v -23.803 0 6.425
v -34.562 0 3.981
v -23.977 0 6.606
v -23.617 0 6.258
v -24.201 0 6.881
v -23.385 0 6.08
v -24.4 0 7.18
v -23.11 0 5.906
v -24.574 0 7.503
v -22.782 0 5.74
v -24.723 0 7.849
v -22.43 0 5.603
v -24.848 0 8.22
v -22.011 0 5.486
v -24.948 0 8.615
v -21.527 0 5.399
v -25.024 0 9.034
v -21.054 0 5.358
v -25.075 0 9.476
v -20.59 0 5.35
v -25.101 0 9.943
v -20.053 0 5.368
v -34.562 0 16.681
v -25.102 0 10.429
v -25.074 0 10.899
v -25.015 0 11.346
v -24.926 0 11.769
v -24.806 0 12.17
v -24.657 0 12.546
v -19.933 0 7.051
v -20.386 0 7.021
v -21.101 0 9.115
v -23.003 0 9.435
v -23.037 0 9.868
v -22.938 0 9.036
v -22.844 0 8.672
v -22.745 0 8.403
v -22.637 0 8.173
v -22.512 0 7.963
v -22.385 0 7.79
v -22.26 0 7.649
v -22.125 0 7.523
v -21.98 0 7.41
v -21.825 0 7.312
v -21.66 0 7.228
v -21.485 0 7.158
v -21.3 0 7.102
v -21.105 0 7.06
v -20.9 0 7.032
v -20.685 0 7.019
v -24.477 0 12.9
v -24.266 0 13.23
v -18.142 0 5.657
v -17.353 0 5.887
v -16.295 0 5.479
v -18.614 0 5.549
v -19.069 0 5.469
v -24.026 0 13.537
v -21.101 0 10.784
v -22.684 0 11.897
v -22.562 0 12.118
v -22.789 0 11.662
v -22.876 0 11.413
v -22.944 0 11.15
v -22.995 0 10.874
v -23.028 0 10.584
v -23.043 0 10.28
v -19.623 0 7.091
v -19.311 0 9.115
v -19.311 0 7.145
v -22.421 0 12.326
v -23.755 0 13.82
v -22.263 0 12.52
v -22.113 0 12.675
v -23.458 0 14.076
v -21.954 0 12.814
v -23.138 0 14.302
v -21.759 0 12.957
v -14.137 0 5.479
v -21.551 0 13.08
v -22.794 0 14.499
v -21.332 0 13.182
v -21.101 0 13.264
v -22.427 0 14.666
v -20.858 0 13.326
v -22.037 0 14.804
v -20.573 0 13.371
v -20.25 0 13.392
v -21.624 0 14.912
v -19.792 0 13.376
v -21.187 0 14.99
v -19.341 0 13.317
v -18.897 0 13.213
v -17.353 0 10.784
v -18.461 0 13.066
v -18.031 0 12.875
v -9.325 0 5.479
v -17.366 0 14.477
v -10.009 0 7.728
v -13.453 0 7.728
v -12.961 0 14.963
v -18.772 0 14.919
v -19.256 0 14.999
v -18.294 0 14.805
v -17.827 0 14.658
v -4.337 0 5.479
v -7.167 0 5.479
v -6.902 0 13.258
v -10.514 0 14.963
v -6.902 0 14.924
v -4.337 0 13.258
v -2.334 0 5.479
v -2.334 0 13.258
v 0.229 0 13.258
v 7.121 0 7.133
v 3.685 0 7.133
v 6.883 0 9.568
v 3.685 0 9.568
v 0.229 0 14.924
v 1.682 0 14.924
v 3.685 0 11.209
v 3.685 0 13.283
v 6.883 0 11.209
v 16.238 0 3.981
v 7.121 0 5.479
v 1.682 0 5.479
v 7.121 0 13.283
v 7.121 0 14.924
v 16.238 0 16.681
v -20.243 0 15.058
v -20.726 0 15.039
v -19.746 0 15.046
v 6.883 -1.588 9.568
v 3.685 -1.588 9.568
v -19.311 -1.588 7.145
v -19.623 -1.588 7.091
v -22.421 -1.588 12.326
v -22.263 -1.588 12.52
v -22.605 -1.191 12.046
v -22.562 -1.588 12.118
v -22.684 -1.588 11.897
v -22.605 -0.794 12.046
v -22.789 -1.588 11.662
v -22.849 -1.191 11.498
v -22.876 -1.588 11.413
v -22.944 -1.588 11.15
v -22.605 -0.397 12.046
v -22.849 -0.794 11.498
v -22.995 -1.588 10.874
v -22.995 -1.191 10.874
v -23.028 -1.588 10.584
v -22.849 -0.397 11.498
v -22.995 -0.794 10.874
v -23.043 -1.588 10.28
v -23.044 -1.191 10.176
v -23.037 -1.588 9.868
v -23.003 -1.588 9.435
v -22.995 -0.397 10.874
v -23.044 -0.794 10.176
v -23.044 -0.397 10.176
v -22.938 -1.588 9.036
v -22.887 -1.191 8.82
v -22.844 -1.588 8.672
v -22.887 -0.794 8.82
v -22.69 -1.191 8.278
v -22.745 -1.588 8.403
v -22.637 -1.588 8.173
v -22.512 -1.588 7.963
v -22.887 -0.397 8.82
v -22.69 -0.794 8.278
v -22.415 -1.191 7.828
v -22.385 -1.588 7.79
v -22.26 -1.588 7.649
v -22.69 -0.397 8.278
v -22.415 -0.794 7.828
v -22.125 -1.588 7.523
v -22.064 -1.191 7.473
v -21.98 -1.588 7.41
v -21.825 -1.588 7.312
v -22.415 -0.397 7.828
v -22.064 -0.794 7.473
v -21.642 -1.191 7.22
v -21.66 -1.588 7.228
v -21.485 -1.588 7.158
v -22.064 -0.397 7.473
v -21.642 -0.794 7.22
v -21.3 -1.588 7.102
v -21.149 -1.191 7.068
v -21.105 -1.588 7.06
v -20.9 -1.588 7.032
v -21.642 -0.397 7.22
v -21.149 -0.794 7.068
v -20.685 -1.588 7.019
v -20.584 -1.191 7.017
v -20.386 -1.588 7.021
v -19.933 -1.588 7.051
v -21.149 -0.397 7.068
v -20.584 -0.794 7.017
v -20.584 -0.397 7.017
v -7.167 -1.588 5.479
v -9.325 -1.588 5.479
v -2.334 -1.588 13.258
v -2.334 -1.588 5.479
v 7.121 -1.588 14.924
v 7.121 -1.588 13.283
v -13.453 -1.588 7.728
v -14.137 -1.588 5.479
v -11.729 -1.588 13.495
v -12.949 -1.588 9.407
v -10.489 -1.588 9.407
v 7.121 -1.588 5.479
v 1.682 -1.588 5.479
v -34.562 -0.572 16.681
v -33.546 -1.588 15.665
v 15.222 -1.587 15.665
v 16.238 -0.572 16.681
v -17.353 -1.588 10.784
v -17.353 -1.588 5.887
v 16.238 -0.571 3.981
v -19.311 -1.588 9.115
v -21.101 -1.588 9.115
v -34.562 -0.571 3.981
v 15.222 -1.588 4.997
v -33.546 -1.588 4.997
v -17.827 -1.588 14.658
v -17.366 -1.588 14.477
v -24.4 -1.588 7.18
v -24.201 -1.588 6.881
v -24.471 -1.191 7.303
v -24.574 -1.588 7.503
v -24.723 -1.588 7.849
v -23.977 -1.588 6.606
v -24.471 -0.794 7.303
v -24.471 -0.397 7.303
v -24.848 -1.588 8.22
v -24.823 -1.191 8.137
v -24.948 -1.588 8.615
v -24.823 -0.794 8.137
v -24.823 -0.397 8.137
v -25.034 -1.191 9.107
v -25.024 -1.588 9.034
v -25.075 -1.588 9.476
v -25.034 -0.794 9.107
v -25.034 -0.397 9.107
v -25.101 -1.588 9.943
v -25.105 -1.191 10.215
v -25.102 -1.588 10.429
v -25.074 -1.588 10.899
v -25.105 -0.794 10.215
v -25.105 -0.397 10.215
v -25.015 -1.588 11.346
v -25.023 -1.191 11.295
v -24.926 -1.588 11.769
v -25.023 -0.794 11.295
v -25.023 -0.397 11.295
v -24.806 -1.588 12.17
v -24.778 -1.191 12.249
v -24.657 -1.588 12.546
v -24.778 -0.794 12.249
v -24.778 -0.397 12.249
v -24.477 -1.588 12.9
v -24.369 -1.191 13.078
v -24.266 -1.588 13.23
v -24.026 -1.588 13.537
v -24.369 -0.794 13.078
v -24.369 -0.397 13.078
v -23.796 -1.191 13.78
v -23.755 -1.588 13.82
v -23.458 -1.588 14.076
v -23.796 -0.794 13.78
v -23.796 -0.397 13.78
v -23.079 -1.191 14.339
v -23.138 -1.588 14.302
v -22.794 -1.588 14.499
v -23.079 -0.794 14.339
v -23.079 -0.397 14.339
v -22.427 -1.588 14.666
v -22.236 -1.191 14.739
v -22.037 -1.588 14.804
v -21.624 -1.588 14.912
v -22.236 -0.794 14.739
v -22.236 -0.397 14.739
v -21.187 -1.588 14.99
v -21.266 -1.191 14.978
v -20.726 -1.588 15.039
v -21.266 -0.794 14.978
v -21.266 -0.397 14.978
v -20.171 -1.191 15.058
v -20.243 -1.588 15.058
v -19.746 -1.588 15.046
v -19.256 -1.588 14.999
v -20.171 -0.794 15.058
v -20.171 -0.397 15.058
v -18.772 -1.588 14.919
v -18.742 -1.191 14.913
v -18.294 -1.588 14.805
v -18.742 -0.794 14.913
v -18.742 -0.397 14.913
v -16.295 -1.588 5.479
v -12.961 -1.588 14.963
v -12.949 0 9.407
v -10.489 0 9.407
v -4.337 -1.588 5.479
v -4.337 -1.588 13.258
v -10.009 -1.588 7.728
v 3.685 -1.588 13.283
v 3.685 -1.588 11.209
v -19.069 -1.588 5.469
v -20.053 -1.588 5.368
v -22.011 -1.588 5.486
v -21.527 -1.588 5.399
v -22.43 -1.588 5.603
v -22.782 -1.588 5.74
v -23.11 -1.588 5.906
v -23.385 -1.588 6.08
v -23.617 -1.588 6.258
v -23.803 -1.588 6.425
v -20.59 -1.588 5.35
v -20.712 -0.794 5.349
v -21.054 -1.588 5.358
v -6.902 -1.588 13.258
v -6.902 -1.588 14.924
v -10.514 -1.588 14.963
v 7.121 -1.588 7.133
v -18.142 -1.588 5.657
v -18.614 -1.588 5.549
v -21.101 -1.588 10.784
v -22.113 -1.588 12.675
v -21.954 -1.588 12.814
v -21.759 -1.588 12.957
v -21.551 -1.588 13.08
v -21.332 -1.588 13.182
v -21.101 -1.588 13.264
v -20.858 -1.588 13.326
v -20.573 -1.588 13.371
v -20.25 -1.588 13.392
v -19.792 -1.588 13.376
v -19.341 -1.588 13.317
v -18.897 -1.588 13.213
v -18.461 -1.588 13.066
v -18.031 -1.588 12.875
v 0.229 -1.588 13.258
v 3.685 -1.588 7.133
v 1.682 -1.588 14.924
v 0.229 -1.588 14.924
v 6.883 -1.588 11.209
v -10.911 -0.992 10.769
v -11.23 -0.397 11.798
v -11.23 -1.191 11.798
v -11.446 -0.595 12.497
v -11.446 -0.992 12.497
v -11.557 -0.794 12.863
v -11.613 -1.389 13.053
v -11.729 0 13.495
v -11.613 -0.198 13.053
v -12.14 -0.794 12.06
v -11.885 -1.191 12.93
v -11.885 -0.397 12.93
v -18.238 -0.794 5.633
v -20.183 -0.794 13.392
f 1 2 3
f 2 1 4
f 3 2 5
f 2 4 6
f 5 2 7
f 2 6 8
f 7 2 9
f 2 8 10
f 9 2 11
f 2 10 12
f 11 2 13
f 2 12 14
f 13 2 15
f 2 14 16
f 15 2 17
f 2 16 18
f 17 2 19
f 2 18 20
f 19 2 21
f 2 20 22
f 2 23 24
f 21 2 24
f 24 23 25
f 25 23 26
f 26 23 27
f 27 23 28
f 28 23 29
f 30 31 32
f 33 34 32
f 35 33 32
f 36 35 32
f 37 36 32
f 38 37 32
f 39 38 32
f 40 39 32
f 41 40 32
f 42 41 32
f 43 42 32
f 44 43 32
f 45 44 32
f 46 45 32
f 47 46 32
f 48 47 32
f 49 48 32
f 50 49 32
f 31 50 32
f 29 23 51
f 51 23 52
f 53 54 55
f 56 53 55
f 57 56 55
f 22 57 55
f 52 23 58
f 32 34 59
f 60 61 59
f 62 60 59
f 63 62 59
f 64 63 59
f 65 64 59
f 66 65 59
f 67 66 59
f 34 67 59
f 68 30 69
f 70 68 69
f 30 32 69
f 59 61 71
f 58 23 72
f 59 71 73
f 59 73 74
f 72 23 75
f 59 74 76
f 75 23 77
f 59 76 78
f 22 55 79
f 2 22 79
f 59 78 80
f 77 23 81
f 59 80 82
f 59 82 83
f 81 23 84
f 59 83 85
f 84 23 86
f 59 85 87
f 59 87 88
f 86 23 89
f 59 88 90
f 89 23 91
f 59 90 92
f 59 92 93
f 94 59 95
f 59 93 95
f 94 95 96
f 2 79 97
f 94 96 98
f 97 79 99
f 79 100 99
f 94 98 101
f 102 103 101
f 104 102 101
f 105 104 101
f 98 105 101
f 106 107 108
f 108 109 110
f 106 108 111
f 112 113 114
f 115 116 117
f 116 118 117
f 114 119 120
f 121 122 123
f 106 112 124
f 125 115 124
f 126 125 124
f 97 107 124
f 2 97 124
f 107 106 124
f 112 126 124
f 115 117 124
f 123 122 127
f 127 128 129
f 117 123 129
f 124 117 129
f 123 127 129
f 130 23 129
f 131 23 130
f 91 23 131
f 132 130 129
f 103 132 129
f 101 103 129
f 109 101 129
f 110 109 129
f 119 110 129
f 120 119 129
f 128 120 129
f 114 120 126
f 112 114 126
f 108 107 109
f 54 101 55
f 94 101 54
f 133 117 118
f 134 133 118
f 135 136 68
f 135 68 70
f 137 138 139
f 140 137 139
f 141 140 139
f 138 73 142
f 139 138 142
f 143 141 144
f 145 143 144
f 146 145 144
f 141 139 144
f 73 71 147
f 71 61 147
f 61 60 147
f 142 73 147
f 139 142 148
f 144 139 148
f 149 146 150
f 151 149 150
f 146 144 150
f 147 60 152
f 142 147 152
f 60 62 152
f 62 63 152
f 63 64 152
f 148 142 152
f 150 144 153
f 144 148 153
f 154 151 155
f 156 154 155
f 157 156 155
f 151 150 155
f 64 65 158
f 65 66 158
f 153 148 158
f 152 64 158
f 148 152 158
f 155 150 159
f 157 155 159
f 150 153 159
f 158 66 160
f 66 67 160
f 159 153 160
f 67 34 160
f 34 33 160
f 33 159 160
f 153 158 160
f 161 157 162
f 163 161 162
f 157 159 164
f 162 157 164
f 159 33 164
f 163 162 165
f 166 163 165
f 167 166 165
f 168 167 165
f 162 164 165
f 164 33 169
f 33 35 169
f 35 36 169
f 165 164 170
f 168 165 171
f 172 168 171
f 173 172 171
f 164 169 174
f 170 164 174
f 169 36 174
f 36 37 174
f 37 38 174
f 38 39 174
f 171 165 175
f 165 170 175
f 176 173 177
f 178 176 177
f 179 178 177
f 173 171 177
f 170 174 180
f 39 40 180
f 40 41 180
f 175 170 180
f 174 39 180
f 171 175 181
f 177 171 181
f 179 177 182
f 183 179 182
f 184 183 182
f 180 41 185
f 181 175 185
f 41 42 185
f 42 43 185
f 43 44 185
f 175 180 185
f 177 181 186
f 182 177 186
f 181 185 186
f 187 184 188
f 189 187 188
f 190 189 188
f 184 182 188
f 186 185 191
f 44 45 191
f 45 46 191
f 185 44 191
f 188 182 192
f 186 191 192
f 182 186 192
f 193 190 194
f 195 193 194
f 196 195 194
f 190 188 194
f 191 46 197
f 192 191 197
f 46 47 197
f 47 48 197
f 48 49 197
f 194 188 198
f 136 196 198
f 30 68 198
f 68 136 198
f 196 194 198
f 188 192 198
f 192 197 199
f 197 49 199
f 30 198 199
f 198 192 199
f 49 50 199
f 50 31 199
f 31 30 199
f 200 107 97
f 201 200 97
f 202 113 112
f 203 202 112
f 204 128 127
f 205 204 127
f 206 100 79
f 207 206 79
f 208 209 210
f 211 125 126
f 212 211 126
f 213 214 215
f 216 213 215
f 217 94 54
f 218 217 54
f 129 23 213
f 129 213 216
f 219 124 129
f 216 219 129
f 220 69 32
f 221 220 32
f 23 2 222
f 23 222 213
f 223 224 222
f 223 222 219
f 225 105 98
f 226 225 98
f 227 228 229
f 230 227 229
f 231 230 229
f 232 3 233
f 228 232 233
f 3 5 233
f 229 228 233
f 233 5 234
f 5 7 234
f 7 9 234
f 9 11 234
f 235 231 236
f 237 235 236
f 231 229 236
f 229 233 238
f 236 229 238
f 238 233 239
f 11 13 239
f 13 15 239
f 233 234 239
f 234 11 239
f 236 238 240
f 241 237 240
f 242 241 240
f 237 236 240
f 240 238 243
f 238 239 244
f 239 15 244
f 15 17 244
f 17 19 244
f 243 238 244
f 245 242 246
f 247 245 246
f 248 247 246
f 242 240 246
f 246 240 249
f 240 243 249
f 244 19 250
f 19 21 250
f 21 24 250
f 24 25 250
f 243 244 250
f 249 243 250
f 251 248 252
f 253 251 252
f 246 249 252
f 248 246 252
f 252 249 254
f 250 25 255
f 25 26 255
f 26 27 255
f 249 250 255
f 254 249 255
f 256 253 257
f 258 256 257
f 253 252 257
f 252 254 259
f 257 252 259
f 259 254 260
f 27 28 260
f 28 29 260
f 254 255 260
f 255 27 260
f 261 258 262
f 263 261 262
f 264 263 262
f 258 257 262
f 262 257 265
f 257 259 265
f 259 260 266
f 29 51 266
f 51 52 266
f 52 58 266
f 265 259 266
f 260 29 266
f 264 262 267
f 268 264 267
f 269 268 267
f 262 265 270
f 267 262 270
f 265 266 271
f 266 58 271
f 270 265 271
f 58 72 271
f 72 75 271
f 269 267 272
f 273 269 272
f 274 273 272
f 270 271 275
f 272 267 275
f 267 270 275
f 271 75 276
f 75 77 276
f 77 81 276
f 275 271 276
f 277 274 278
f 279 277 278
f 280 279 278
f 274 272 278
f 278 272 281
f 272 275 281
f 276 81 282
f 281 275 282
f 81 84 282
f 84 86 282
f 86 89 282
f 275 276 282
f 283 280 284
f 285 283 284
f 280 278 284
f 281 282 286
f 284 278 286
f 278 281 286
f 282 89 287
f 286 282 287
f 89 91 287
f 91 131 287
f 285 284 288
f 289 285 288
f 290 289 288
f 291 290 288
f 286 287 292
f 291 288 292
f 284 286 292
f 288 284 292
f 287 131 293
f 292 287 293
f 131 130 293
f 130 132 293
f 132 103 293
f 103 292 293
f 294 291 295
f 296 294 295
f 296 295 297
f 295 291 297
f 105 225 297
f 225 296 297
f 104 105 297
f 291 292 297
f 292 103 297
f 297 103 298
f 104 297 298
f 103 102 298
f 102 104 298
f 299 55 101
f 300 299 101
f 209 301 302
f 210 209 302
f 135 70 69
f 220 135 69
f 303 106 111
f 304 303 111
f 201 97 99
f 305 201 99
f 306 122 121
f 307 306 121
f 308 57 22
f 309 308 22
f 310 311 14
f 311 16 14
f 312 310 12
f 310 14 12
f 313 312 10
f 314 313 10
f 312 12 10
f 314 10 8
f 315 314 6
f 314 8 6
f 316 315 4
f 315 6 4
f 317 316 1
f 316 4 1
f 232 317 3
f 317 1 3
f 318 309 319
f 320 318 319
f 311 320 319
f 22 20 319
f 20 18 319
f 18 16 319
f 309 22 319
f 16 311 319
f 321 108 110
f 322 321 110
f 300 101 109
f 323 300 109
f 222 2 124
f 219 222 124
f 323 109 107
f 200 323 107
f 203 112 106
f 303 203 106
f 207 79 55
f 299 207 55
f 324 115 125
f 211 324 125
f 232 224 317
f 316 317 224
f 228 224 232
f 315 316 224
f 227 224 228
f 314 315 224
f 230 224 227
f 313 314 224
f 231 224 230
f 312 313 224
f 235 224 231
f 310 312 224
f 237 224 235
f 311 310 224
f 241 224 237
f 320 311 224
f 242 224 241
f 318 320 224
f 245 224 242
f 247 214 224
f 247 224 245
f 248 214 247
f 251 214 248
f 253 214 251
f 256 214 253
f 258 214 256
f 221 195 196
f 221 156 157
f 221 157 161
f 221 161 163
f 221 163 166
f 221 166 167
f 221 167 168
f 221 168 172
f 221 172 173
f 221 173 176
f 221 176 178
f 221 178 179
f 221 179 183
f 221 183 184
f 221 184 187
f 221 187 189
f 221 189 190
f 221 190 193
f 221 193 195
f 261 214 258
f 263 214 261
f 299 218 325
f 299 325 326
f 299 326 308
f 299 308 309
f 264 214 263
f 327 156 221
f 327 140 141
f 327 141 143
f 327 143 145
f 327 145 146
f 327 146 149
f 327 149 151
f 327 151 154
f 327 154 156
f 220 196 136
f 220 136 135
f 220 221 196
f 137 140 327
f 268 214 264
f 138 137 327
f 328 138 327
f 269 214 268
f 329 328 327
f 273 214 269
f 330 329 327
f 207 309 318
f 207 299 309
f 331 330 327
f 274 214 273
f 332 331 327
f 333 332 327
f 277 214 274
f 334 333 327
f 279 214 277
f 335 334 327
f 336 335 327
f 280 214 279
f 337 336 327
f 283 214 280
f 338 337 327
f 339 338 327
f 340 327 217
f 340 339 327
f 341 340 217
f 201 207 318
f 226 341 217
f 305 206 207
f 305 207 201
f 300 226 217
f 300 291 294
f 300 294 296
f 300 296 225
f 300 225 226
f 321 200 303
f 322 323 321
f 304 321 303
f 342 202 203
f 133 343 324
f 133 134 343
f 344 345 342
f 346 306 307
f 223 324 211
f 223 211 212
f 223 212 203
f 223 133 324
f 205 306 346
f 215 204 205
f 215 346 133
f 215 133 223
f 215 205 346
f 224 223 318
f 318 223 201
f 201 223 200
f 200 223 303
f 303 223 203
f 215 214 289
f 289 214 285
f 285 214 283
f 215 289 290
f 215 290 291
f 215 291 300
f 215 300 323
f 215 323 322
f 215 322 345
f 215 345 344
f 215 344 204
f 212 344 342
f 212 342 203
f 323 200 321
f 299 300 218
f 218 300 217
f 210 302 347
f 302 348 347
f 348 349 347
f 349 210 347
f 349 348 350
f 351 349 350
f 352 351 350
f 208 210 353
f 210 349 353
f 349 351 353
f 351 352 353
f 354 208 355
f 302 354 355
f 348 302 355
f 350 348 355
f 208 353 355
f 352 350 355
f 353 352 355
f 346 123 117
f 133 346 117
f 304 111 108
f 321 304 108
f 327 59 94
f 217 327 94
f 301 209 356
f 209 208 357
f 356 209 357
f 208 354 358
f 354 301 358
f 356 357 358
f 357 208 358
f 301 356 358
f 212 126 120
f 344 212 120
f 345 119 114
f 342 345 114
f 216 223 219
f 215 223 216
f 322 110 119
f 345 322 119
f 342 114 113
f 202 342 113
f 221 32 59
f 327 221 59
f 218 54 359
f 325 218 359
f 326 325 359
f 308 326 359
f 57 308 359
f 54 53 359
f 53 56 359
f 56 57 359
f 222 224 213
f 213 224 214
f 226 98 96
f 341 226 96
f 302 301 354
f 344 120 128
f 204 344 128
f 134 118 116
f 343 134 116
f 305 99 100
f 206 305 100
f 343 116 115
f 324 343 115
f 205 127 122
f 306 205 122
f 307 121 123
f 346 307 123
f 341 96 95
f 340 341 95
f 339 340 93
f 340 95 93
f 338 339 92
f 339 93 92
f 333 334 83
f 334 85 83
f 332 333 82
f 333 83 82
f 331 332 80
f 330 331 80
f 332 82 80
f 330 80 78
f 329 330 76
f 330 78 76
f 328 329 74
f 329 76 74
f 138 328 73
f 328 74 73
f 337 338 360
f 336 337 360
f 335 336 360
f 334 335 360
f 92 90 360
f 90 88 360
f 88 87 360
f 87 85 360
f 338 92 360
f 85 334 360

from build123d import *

# Parameters (mm, degrees)
F0_W     = 50.8
F0_H     = 12.7
F1_DEPTH = 1.5875
F2_SIZE  = 1.016


# Not quite as in the source:
# - a feature names something its author has since deleted; it is built from what else it names


with BuildPart() as f1:
    # F0 (on Front) → F1 (new body)
    with BuildSketch(Plane.XZ):
        with Locations((-9.1615320603, 10.3311909613)):
            Rectangle(F0_W, F0_H)
        with BuildLine():
            Line((-21.1010067493, 9.1154048977), (-21.1010067493, 10.7835201321))
            Line((-21.1010067493, 10.7835201321), (-17.3534318796, 10.7835201321))
            Line((-17.3534318796, 10.7835201321), (-17.3534318796, 5.8866614081))
            add(Edge.make_bspline(
                [(-17.3534318796, 5.8866614081), (-18.2650041452, 5.5890051581), (-19.0690894316, 5.4691158352)],
                knots=[0, 0, 0, 1, 1, 1], degree=2))
            add(Edge.make_bspline(
                [(-19.0690894316, 5.4691158352), (-19.8731747181, 5.3492265123), (-20.7123999785, 5.3492265123)],
                knots=[0, 0, 0, 1, 1, 1], degree=2))
            add(Edge.make_bspline(
                [(-20.7123999785, 5.3492265123), (-22.8497372181, 5.3492265123), (-23.9773169707, 6.6059973456)],
                knots=[0, 0, 0, 1, 1, 1], degree=2))
            add(Edge.make_bspline(
                [(-23.9773169707, 6.6059973456), (-25.1048967233, 7.862768179), (-25.1048967233, 10.2150793769)],
                knots=[0, 0, 0, 1, 1, 1], degree=2))
            add(Edge.make_bspline(
                [(-25.1048967233, 10.2150793769), (-25.1048967233, 12.5012447415), (-23.7964494577, 13.7797196764)],
                knots=[0, 0, 0, 1, 1, 1], degree=2))
            add(Edge.make_bspline(
                [(-23.7964494577, 13.7797196764), (-22.4880021921, 15.0581946113), (-20.1708309681, 15.0581946113)],
                knots=[0, 0, 0, 1, 1, 1], degree=2))
            add(Edge.make_bspline(
                [(-20.1708309681, 15.0581946113), (-18.7156226348, 15.0581946113), (-17.3658342233, 14.4773515123)],
                knots=[0, 0, 0, 1, 1, 1], degree=2))
            Line((-17.3658342233, 14.4773515123), (-18.0314266712, 12.8753821113))
            add(Edge.make_bspline(
                [(-18.0314266712, 12.8753821113), (-19.0649553171, 13.3921464342), (-20.1832333118, 13.3921464342)],
                knots=[0, 0, 0, 1, 1, 1], degree=2))
            add(Edge.make_bspline(
                [(-20.1832333118, 13.3921464342), (-21.481345291, 13.3921464342), (-22.2626929473, 12.5198482571)],
                knots=[0, 0, 0, 1, 1, 1], degree=2))
            add(Edge.make_bspline(
                [(-22.2626929473, 12.5198482571), (-23.0440406035, 11.64755008), (-23.0440406035, 10.1758052883)],
                knots=[0, 0, 0, 1, 1, 1], degree=2))
            add(Edge.make_bspline(
                [(-23.0440406035, 10.1758052883), (-23.0440406035, 8.6379146633), (-22.4146216582, 7.827628205)],
                knots=[0, 0, 0, 1, 1, 1], degree=2))
            add(Edge.make_bspline(
                [(-22.4146216582, 7.827628205), (-21.7852027129, 7.0173417467), (-20.5842424264, 7.0173417467)],
                knots=[0, 0, 0, 1, 1, 1], degree=2))
            add(Edge.make_bspline(
                [(-20.5842424264, 7.0173417467), (-19.9558570098, 7.0173417467), (-19.3109351348, 7.1454992988)],
                knots=[0, 0, 0, 1, 1, 1], degree=2))
            Line((-19.3109351348, 7.1454992988), (-19.3109351348, 9.1154048977))
            Line((-19.3109351348, 9.1154048977), (-21.1010067493, 9.1154048977))
        make_face(mode=Mode.SUBTRACT)
        Polygon((-7.1669735462, 5.4794511217), (-9.3249813587, 5.4794511217), (-10.0091773223, 7.728409455), (-13.4528947702, 7.728409455), (-14.1370907337, 5.4794511217), (-16.2950985462, 5.4794511217), (-12.9609351348, 14.9631099758), (-10.5135393014, 14.9631099758), align=None, mode=Mode.SUBTRACT)
        Polygon((-2.3341935983, 13.2577877102), (-2.3341935983, 5.4794511217), (-4.3371721139, 5.4794511217), (-4.3371721139, 13.2577877102), (-6.9023902129, 13.2577877102), (-6.9023902129, 14.9238358873), (0.2289574434, 14.9238358873), (0.2289574434, 13.2577877102), align=None, mode=Mode.SUBTRACT)
        Polygon((7.1205264538, 7.133096955), (7.1205264538, 5.4794511217), (1.6820987194, 5.4794511217), (1.6820987194, 14.9238358873), (7.1205264538, 14.9238358873), (7.1205264538, 13.2825923977), (3.685077235, 13.2825923977), (3.685077235, 11.2093339342), (6.8828148652, 11.2093339342), (6.8828148652, 9.5680904446), (3.685077235, 9.5680904446), (3.685077235, 7.133096955), align=None, mode=Mode.SUBTRACT)
    extrude(amount=F1_DEPTH)

    # F2
    f2_edges = [f1.edges().sort_by_distance(p)[0] for p in [
        (-9.161532, -1.5875, 3.981191),
        (-34.561532, -1.5875, 10.331191),
        (-9.161532, -1.5875, 16.681191),
        (16.238468, -1.5875, 10.331191),
    ]]
    chamfer(f2_edges, length=F2_SIZE)


with BuildPart() as f1b:
    # F0 (on Front) → F1, piece 2 (new body)
    with BuildSketch(Plane.XZ):
        with BuildLine():
            Line((-12.948532791, 9.4068599758), (-10.4887346139, 9.4068599758))
            add(Edge.make_bspline(
                [(-10.4887346139, 9.4068599758), (-11.4375139108, 12.4619706529), (-11.5574032337, 12.8629797675)],
                knots=[0, 0, 0, 1, 1, 1], degree=2))
            add(Edge.make_bspline(
                [(-11.5574032337, 12.8629797675), (-11.6772925566, 13.2639888821), (-11.7289689889, 13.4954992988)],
                knots=[0, 0, 0, 1, 1, 1], degree=2))
            add(Edge.make_bspline(
                [(-11.7289689889, 13.4954992988), (-11.94187589, 12.6686763821), (-12.948532791, 9.4068599758)],
                knots=[0, 0, 0, 1, 1, 1], degree=2))
        make_face()
    extrude(amount=F1_DEPTH)


solid = Compound([f1.part, f1b.part])
